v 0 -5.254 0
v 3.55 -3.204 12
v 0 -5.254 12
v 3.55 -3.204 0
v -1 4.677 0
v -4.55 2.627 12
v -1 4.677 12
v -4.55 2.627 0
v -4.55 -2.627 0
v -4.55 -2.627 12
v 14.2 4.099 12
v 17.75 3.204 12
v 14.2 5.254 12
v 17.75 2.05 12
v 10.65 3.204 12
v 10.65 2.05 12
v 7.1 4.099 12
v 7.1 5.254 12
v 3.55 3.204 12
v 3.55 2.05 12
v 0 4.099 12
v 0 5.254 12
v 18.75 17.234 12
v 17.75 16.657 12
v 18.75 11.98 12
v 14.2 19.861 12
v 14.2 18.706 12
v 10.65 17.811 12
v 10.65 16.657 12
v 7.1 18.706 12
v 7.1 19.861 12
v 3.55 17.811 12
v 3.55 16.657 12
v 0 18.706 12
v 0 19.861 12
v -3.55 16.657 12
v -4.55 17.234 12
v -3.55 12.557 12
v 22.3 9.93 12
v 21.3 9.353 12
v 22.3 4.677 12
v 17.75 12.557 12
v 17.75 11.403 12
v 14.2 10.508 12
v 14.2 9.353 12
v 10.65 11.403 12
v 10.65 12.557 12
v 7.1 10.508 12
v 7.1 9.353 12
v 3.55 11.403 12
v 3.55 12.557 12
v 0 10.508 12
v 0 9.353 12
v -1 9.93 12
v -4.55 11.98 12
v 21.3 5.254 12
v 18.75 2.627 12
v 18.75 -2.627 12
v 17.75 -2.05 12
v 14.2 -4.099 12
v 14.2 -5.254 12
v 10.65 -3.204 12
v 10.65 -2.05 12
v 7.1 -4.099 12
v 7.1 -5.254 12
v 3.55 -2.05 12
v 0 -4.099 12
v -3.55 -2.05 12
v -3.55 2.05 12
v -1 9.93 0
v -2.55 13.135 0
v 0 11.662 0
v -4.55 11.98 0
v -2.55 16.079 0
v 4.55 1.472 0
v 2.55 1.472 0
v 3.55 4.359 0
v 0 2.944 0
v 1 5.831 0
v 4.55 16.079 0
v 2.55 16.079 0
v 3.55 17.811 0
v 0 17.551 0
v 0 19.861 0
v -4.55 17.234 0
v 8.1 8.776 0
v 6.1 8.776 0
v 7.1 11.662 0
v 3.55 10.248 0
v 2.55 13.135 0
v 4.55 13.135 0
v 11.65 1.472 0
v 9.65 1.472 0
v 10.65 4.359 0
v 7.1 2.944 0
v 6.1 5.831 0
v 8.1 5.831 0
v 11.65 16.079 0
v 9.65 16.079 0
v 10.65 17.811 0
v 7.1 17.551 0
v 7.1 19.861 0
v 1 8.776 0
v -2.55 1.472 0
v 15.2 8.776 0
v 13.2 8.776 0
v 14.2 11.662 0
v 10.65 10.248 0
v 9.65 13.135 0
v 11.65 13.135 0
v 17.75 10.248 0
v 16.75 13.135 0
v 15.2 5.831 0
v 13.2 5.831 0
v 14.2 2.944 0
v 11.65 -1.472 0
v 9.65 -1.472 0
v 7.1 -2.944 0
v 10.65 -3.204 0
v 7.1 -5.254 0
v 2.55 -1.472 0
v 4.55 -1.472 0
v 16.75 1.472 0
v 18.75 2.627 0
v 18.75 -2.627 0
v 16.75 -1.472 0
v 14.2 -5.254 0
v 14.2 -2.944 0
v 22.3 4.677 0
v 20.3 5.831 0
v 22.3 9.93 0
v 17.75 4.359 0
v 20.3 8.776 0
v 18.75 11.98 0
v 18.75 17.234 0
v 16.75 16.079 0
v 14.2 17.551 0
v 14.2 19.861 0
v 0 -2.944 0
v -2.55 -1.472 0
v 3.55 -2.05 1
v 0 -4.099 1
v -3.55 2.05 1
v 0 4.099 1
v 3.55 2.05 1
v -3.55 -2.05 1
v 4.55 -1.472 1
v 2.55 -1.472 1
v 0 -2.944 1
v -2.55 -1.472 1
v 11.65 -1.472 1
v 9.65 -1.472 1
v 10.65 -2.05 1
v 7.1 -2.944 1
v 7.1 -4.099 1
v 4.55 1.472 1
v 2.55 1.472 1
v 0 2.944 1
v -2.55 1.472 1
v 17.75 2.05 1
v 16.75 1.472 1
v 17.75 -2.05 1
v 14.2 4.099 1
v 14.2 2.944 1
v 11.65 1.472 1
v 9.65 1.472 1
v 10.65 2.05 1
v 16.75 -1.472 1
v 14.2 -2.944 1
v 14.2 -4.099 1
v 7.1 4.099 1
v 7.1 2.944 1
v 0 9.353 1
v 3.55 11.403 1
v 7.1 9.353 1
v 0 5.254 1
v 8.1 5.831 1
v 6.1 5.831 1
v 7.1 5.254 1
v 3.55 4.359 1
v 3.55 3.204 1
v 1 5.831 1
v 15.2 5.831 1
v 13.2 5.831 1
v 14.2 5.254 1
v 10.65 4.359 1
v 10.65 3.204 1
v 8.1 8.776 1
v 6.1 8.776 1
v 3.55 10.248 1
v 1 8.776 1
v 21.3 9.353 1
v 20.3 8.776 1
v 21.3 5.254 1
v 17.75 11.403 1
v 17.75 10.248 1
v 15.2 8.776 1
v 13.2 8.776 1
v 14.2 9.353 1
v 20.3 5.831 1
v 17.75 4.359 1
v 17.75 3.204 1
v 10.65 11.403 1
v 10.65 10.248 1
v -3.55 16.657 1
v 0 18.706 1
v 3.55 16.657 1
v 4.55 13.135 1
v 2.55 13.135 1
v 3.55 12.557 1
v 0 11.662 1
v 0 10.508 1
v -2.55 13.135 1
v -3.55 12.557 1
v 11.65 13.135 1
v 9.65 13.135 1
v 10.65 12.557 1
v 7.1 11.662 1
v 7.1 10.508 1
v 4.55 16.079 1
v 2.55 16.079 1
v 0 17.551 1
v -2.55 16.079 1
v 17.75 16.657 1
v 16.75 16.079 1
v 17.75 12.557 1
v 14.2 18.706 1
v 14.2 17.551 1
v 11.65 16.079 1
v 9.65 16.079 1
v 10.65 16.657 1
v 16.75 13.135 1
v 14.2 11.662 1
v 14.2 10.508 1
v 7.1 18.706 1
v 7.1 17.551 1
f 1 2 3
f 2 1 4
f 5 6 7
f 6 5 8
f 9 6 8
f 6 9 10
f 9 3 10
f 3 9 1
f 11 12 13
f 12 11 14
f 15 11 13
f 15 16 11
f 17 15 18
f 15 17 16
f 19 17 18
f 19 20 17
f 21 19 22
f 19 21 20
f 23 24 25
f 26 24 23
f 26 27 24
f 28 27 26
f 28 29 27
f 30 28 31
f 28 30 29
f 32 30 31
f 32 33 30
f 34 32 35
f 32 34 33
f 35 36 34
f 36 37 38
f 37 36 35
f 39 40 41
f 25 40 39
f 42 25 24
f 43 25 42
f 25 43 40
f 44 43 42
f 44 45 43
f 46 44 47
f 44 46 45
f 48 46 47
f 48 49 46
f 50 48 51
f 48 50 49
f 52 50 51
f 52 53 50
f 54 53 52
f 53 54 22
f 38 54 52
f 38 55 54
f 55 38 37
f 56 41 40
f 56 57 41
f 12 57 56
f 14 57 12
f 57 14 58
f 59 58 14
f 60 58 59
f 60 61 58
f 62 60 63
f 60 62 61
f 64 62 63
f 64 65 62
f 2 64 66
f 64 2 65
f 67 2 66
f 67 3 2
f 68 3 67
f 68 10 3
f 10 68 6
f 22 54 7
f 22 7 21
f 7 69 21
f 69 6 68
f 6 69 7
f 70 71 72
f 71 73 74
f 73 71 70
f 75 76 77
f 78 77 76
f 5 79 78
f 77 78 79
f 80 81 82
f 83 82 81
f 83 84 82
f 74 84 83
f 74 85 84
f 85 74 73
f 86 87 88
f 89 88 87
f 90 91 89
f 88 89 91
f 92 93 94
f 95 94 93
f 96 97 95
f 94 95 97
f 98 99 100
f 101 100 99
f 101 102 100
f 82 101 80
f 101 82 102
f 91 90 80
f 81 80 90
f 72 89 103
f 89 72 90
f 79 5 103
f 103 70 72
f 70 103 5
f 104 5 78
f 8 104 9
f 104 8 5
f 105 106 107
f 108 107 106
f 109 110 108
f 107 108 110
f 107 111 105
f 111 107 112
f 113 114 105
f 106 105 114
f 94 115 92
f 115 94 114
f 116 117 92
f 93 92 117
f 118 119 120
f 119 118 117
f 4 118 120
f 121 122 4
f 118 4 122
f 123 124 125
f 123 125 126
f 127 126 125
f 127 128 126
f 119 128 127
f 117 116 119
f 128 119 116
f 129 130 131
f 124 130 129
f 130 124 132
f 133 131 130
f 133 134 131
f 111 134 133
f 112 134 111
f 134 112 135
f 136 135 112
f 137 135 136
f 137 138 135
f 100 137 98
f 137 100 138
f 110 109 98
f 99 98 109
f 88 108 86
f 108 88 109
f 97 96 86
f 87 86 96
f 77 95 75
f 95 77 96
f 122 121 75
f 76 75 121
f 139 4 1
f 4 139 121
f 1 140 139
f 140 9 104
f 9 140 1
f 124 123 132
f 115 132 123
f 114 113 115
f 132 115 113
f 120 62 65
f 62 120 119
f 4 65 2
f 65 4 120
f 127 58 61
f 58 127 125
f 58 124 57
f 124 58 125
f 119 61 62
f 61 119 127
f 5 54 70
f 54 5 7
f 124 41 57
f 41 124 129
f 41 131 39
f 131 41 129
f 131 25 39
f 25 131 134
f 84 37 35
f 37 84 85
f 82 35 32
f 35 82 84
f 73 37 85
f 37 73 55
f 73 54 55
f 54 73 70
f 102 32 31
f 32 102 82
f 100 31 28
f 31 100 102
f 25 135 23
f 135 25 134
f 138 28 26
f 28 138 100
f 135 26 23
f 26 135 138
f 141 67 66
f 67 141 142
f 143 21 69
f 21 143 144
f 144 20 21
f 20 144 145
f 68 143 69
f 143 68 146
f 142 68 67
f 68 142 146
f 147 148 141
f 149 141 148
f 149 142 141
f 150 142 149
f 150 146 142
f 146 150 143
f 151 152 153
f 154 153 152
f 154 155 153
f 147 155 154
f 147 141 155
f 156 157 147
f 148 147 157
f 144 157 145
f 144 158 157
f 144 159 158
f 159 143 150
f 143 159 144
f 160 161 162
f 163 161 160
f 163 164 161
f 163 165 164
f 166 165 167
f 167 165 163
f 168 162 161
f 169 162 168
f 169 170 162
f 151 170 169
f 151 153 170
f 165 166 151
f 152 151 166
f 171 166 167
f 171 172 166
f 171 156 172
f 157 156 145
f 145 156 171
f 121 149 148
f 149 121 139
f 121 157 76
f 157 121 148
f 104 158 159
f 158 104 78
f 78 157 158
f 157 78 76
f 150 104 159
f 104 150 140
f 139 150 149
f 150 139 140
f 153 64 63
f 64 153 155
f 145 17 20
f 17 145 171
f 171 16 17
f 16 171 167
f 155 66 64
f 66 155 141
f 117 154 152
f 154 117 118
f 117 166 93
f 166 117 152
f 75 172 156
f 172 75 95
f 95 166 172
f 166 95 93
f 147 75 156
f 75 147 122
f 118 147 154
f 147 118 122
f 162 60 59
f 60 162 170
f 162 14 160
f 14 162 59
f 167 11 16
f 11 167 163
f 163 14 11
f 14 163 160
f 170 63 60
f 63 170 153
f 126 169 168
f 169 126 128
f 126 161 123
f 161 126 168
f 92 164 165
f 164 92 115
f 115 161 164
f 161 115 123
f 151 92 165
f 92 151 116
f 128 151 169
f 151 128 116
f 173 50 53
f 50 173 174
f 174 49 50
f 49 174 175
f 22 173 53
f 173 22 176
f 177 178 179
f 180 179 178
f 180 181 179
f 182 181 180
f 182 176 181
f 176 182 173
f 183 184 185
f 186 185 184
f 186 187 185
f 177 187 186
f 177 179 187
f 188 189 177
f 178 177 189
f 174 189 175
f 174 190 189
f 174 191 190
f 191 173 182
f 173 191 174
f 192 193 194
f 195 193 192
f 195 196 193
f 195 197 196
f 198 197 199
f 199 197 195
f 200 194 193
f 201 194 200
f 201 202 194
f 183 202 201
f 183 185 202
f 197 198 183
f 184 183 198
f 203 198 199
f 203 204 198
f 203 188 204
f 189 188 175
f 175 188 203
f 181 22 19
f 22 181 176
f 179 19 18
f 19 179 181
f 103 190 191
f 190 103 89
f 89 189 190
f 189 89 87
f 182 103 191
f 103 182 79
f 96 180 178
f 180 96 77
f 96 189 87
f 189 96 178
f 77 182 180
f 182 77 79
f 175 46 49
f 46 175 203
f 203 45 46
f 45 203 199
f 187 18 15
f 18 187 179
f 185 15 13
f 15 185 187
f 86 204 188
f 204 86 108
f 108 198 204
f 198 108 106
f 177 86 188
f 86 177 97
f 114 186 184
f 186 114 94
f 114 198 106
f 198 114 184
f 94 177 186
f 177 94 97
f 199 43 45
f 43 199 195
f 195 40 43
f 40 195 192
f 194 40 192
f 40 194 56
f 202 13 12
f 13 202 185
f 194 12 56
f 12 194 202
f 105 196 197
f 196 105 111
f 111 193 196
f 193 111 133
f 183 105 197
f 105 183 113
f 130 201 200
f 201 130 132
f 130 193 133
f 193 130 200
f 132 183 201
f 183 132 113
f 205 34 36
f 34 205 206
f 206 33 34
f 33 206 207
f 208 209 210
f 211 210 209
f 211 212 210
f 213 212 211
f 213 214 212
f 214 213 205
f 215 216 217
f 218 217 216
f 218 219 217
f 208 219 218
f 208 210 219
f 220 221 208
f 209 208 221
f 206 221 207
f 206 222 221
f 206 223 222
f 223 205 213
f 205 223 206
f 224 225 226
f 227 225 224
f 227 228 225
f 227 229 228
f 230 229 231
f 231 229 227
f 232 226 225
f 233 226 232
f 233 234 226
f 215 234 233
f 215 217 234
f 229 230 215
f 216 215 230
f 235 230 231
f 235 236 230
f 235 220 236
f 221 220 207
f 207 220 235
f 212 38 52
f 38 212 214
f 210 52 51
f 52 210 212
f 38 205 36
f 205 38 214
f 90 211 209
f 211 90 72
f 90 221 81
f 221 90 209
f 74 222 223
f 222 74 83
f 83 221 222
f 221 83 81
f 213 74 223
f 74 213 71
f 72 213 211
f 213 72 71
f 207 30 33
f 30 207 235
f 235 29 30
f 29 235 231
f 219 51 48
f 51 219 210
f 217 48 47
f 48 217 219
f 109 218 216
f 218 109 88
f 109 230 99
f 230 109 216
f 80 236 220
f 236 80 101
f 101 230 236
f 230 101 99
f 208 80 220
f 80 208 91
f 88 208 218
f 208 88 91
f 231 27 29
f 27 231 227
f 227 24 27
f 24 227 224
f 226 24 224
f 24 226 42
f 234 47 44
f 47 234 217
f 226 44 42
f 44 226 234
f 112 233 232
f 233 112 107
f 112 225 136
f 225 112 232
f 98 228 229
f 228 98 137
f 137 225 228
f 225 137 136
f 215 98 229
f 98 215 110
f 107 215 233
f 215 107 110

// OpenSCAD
//Hex Bit Holder
//Copyright 2017 Douglas Peale

// downloaded from https://www.thingiverse.com/thing:2406308/files


SizeOfBit=0.25*25.4;
NumberOfRows=3;
NumberOfBitsPerRow=3;
Clearance=0.75;

WallThickness=1;
WallHeight=11;

difference(){
    union(){
        for(i=[0:NumberOfRows-1]){
            for(j=[0:NumberOfBitsPerRow-1]){
                    //Create the basic chunk of plastic we are going to build this out of.
                translate([(2*ceil(i/2)-i)*(SizeOfBit+Clearance)/2+(SizeOfBit+Clearance)*j,i*((SizeOfBit+Clearance)/cos(30)+WallThickness/cos(30)-(SizeOfBit+Clearance)/2/cos(30)*sin(30)),0]){
                    rotate([0,0,30]) cylinder_outer(height=WallThickness+WallHeight,radius=(SizeOfBit+Clearance+2*WallThickness)/2,fn=6);
                }
            }
        }
    }
    for(i=[0:NumberOfRows-1]){
        for(j=[0:NumberOfBitsPerRow-1]){
                //Remove plugs a bit bigger than the bits for the bits to fit into.
            translate([(2*ceil(i/2)-i)*(SizeOfBit+Clearance)/2+(SizeOfBit+Clearance)*j,i*((SizeOfBit+Clearance)/cos(30)+WallThickness/cos(30)-(SizeOfBit+Clearance)/2/cos(30)*sin(30)),WallThickness]){
                rotate([0,0,30])cylinder_outer(height=WallThickness+WallHeight,radius=(SizeOfBit+Clearance)/2,fn=6);
            }
                //Punch holes in the bottom to save time and plastic.
            translate([(2*ceil(i/2)-i)*(SizeOfBit+Clearance)/2+(SizeOfBit+Clearance)*j,i*((SizeOfBit+Clearance)/cos(30)+WallThickness/cos(30)-(SizeOfBit+Clearance)/2/cos(30)*sin(30)),-.1]){
                rotate([0,0,30])cylinder_outer(height=WallThickness+WallHeight,radius=(SizeOfBit+Clearance)/2-1,fn=6);
            }
        }
            //Remove those pesky zero width pieces caused by round off error that remain between adjacent bit holes.
        translate([(2*ceil(i/2)-i)*(SizeOfBit+Clearance)/2,i*((SizeOfBit+Clearance)/cos(30)+WallThickness/cos(30)-(SizeOfBit+Clearance)/2/cos(30)*sin(30))-(SizeOfBit+Clearance)*sin(30)/cos(30)/2,WallThickness])cube([(NumberOfBitsPerRow-1)*(SizeOfBit+Clearance),(SizeOfBit+Clearance)*sin(30)/cos(30),WallThickness+WallHeight]);
    }
}

module cylinder_outer(height,radius,fn){
   fudge = 1/cos(180/fn);
   cylinder(h=height,r=radius*fudge,$fn=fn);}
